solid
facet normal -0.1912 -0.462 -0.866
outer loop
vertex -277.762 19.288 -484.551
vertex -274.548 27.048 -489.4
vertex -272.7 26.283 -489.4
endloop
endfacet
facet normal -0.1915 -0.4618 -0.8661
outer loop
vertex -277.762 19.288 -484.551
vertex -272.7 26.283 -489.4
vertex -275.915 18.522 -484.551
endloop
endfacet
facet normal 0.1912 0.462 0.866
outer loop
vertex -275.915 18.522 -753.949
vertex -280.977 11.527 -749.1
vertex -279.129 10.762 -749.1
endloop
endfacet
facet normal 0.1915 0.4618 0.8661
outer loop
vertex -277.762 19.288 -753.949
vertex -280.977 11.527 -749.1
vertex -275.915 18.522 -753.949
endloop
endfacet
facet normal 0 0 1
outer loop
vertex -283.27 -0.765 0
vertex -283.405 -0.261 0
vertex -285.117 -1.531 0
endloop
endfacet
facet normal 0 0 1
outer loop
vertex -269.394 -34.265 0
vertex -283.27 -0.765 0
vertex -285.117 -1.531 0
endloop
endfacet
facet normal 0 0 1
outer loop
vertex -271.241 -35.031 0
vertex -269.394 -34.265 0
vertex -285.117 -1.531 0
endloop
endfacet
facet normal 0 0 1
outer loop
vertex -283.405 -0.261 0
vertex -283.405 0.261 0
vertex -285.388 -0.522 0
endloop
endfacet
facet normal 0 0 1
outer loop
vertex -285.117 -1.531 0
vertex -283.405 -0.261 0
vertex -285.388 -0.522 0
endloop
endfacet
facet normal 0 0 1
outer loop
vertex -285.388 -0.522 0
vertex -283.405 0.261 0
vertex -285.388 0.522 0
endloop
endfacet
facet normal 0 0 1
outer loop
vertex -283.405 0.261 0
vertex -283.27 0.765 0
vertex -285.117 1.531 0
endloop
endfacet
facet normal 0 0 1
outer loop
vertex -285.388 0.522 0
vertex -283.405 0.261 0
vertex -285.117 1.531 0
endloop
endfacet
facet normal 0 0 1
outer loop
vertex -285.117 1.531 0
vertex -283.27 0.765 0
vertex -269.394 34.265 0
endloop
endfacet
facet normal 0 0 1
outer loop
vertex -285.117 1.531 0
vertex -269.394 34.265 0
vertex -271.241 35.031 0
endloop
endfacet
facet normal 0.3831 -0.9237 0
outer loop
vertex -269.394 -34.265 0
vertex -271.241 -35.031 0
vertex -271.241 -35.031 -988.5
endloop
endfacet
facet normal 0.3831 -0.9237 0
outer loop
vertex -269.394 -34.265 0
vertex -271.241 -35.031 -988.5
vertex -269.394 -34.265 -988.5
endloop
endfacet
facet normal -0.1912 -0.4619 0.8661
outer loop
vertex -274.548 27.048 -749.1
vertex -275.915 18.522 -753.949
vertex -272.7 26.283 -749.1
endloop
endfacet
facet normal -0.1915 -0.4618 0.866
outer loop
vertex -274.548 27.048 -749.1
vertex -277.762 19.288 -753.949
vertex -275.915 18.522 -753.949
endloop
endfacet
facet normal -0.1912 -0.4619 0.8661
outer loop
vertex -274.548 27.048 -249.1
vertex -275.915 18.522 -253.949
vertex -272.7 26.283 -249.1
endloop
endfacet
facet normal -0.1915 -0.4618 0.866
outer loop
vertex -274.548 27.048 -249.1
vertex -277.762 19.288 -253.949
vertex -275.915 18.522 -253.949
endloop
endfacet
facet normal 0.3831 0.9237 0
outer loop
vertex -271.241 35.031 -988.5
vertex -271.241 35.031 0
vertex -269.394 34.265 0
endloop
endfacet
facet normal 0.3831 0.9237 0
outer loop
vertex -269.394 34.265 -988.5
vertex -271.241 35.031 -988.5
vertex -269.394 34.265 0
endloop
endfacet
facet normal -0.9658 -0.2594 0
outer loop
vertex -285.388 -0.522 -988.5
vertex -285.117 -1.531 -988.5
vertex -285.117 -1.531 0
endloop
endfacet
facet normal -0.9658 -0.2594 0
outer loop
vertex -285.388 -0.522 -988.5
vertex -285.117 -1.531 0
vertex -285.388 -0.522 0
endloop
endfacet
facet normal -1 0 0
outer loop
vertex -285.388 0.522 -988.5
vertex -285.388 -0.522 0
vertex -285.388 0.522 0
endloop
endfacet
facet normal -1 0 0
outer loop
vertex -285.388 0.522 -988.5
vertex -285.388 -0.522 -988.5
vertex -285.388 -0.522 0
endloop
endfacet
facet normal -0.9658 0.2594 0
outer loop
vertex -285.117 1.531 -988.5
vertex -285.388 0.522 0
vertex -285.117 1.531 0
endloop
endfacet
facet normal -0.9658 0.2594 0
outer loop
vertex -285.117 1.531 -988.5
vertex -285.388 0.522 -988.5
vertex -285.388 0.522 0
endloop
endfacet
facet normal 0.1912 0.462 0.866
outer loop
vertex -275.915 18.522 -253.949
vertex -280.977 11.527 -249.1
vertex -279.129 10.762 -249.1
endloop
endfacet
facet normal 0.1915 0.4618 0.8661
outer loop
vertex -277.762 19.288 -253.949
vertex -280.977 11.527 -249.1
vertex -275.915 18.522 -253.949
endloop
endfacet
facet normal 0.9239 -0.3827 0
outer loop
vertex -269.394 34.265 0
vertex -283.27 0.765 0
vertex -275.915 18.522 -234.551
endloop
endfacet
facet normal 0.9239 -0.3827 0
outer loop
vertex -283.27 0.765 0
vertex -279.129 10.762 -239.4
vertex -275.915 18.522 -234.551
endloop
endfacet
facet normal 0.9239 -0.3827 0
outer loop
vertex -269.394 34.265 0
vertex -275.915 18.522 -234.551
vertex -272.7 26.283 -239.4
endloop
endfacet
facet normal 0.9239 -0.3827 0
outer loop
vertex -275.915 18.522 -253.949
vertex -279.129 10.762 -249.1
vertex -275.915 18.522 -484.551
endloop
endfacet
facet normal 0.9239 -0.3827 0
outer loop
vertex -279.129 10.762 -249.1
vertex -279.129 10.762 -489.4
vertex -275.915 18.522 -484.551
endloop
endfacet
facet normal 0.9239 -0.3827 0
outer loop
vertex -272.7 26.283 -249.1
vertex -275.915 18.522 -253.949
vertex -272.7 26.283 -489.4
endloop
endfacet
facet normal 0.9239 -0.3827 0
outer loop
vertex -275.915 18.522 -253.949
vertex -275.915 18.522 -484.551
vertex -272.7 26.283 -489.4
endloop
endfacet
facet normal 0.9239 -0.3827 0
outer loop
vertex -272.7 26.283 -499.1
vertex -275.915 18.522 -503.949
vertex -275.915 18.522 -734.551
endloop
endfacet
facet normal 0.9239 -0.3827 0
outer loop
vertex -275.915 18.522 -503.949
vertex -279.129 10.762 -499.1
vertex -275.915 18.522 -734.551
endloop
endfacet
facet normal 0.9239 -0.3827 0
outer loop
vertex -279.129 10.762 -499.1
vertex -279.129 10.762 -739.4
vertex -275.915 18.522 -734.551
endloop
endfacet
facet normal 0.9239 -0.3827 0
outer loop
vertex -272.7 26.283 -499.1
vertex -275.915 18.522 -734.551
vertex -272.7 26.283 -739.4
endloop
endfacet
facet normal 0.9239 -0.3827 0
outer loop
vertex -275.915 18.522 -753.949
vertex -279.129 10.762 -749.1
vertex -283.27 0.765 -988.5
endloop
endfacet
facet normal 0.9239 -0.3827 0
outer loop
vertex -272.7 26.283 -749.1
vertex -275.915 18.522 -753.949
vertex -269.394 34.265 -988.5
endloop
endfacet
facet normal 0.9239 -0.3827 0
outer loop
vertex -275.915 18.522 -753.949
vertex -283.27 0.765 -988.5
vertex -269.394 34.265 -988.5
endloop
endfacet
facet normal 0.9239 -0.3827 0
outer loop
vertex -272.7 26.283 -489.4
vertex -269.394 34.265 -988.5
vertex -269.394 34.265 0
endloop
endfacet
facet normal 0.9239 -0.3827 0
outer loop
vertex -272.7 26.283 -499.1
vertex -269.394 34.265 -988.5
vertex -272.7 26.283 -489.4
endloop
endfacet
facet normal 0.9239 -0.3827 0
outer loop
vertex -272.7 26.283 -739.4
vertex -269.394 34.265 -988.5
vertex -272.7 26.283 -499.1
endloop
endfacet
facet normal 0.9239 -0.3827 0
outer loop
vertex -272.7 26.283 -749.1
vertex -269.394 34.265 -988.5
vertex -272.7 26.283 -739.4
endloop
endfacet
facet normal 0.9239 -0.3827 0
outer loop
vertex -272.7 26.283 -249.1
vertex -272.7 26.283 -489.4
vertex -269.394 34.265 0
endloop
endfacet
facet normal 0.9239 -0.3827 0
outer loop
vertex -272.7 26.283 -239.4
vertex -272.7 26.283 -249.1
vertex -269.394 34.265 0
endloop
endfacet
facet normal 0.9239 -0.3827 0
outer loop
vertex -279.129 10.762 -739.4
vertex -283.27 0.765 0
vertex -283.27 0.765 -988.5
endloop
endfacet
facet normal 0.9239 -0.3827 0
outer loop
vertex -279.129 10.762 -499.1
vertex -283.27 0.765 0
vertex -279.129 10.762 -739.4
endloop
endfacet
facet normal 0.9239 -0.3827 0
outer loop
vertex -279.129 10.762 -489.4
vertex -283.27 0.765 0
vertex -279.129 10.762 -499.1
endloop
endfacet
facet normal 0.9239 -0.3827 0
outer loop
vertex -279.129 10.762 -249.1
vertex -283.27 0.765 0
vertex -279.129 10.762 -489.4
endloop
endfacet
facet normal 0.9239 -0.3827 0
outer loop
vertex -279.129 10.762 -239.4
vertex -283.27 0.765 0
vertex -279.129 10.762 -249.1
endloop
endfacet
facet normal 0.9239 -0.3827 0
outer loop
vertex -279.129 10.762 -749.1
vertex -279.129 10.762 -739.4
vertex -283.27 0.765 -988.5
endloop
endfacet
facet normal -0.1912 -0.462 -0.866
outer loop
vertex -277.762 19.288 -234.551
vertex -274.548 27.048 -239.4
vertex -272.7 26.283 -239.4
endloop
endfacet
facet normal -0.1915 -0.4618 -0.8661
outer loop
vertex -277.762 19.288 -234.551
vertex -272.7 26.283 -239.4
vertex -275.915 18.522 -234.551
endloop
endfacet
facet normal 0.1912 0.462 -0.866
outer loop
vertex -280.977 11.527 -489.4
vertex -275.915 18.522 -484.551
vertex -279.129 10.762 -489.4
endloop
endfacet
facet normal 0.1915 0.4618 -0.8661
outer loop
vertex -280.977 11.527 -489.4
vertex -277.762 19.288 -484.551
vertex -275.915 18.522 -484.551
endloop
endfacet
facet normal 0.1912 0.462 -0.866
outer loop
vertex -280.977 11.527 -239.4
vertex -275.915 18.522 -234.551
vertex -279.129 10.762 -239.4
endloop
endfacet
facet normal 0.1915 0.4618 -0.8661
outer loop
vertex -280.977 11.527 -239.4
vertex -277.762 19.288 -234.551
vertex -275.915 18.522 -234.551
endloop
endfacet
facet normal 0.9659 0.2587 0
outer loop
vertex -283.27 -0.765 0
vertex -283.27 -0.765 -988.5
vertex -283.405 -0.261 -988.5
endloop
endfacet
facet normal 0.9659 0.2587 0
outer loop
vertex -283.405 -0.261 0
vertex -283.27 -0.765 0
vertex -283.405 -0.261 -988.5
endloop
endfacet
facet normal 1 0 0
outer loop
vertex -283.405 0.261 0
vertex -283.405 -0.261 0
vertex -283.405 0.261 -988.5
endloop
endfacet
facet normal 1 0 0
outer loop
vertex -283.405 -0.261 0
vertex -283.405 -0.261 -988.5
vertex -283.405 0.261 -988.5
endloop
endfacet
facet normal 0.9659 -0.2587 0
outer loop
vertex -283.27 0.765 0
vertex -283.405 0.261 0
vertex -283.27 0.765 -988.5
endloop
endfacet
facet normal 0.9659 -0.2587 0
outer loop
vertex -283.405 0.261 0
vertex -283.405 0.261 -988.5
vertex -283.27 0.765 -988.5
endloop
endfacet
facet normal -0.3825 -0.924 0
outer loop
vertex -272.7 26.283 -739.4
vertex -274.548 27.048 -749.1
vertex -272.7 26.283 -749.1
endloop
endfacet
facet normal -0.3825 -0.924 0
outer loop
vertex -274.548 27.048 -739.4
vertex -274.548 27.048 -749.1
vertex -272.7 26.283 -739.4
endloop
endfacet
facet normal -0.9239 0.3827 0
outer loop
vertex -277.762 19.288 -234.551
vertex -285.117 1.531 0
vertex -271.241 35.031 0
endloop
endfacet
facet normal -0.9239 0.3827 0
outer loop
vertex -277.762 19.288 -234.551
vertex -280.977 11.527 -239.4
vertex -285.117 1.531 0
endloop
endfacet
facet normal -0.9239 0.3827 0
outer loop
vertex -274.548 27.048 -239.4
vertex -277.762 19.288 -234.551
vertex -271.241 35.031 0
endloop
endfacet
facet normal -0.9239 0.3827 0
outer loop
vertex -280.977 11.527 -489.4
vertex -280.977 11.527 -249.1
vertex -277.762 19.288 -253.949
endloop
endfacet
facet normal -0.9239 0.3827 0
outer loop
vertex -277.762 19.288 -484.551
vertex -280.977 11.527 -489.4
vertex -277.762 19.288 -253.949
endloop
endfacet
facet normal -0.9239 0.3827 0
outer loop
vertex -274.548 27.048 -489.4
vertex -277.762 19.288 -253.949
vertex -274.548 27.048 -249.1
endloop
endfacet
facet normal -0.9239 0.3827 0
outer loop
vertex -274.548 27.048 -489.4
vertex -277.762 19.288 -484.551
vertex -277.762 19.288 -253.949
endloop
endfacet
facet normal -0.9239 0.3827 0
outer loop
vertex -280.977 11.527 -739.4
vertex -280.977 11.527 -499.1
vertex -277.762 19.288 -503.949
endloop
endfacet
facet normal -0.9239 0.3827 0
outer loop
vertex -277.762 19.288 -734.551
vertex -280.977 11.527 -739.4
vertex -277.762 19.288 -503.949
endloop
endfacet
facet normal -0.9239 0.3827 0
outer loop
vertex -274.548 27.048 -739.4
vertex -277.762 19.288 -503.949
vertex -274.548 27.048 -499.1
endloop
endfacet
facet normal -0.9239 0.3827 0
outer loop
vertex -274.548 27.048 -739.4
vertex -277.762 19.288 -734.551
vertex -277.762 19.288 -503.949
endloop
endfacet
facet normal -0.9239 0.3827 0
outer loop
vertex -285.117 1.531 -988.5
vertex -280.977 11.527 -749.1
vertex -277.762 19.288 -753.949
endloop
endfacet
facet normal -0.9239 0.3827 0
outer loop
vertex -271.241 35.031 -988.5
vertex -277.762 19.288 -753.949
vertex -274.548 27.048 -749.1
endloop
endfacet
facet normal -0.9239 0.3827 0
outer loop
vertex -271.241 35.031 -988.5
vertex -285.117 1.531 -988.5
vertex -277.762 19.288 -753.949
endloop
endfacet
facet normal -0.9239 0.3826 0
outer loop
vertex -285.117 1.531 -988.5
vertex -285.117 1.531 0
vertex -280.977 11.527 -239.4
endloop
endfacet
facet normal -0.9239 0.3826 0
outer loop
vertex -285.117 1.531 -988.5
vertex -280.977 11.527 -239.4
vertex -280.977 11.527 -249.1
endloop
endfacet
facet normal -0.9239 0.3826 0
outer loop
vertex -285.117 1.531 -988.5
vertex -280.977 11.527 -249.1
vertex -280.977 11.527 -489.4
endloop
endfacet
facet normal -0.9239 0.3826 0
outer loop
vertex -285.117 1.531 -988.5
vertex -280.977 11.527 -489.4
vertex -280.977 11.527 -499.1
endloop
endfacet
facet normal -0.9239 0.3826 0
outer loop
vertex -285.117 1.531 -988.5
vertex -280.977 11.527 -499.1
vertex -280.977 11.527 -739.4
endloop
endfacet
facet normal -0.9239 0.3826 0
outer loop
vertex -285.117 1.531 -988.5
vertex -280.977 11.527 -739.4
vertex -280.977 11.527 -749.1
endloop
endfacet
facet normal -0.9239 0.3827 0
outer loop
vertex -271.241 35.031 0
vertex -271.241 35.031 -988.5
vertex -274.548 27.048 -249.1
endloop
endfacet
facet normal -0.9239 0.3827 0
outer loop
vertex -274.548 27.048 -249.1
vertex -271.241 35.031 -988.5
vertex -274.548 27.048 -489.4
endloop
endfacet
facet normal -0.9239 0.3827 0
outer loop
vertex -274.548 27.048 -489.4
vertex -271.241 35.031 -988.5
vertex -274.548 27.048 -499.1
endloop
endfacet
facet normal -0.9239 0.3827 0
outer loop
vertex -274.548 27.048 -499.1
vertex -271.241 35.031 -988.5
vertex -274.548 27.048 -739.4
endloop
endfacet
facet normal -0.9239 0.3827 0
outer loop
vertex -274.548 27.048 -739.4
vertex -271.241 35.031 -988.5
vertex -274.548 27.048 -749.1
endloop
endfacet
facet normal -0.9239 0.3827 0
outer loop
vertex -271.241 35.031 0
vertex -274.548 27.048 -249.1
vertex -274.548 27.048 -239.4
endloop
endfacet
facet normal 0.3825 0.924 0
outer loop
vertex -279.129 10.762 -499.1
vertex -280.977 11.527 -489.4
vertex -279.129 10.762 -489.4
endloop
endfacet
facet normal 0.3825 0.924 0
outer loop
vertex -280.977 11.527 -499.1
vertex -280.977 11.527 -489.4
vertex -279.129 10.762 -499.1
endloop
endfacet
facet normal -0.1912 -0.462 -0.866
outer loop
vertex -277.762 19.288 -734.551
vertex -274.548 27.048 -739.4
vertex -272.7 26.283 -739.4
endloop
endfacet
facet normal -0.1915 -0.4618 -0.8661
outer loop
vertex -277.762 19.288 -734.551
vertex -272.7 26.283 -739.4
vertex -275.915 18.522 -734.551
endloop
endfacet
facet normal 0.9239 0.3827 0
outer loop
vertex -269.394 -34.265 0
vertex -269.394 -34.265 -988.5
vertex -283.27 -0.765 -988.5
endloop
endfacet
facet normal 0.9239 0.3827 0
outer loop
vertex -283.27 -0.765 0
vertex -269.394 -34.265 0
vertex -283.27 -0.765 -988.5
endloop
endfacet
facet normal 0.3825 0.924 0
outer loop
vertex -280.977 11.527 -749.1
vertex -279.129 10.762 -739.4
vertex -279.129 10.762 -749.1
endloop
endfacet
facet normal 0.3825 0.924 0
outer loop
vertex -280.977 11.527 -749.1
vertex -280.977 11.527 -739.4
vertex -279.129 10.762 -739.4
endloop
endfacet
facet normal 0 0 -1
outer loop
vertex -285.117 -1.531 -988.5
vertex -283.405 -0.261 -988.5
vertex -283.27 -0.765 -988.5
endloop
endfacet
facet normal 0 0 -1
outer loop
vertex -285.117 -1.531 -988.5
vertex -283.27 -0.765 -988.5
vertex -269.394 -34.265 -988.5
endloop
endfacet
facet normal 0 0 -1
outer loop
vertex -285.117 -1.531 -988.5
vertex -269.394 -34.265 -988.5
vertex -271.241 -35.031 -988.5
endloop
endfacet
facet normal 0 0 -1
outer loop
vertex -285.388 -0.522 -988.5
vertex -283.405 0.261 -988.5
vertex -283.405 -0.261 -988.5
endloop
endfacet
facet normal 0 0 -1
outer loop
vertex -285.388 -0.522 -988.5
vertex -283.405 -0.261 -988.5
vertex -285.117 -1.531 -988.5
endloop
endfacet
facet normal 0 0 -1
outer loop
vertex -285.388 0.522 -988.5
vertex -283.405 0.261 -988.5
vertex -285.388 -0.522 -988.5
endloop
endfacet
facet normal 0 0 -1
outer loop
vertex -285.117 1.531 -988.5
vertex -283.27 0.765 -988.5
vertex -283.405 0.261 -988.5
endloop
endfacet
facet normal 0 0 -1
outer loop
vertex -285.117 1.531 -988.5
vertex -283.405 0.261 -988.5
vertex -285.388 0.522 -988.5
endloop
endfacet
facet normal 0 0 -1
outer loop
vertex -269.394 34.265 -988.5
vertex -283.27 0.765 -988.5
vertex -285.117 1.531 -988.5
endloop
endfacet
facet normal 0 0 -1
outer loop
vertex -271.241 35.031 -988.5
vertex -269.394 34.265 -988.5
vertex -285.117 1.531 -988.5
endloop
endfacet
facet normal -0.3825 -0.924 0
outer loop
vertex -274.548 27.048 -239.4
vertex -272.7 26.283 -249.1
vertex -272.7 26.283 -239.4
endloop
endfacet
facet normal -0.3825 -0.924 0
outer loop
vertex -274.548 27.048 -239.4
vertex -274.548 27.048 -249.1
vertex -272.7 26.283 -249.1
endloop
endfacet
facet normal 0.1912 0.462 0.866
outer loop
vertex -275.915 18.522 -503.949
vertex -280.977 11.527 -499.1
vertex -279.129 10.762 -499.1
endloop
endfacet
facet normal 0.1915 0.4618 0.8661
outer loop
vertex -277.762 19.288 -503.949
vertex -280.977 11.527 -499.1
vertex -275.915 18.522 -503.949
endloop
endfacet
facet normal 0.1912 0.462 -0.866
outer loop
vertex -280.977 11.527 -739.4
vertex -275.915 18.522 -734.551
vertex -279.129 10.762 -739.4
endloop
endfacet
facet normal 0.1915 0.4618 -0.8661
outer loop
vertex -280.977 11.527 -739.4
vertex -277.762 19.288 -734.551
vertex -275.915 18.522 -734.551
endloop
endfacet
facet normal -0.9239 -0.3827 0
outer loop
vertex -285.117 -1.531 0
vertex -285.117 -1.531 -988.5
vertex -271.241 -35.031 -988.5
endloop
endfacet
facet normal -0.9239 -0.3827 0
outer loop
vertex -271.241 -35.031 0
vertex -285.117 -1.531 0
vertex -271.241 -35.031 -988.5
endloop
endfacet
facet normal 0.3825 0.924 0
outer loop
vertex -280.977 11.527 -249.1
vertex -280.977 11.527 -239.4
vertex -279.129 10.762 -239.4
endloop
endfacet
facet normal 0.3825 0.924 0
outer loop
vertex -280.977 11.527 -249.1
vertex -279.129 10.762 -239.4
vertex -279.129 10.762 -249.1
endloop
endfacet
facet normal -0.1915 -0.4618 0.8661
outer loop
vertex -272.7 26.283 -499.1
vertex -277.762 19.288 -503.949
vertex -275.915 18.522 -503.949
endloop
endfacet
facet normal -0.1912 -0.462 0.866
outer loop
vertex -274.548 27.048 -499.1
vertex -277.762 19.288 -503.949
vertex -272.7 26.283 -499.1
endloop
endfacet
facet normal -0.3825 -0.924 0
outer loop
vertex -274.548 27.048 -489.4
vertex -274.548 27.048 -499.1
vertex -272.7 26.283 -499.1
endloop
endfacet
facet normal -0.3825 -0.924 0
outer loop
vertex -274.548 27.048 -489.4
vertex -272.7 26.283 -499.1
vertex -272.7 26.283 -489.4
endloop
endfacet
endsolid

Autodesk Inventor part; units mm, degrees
ref_plane "YZ Plane" through (0, 0, 0) normal (1, 0, 0) x (0, 1, 0)
ref_plane "XZ Plane" through (0, 0, 0) normal (0, 1, 0) x (-1, 0, 0)
ref_plane "XY Plane" through (0, 0, 0) normal (0, 0, 1) x (1, 0, 0)
sketch "Sketch4" plane through (0, 0, 0) normal (0, 0, 1) x (1, 0, 0)
  line L0 (-202.056852, 202.056852) -> (0, 285.751541) construction
  line L1 (0, 285.751541) -> (202.056852, 202.056852) construction
  line L2 (202.056852, 202.056852) -> (285.751541, 0) construction
  line L3 (285.751541, 0) -> (202.056852, -202.056852) construction
  line L4 (202.056852, -202.056852) -> (0, -285.751541) construction
  line L5 (0, -285.751541) -> (-202.056852, -202.056852) construction
  line L6 (-202.056852, -202.056852) -> (-285.751541, 0) construction
  line L7 (-285.751541, 0) -> (-202.056852, 202.056852) construction
  line L8 (-285.11749, 1.530734) -> (-271.241389, 35.030606)
  line L9 (-285.11749, -1.530734) -> (-271.241389, -35.030606)
  arc A0 (-285.11749, 1.530734) -> (-285.11749, -1.530734) centre (-281.421972, 0) ccw
  point P0 (0, 0)
  point P1 (0, 0)
  point P2 (0, 0)
  dimension "d16" = 528
  dimension "d23" = 36.26
  dimension "d24" = 4
contour flange "Contour Flange1" sketch "Sketch4" thickness 2 bend radius 2 width 988.5 along (0, 0, -1) mid plane no both sides no wall seen from (-278.17944, 18.28067, 0) lies toward (0.9238795, -0.3826834, 0) curves L8 A0 L9
bend "Bend2"
corner "Corner2"
sketch "Sketch6" plane through (-285.11749, 1.530734, 0) normal (-0.9238795, 0.3826834, 0) x (0.3826834, 0.9238795, 0)
  circle A0 centre (19.22, 40.75) radius 5.5 construction
  circle A1 centre (19.22, 947.75) radius 5.5 construction
  line L0 (0, 0) -> (0, 988.5)
  line L1 (36.26, 988.5) -> (0, 988.5)
  line L2 (36.26, 0) -> (0, 0)
  line L3 (27.62, 942.900258) -> (19.22, 938.050515)
  line L4 (19.22, 938.050515) -> (10.82, 942.900258)
  line L5 (10.82, 942.900258) -> (10.82, 952.599742)
  line L6 (10.82, 952.599742) -> (19.22, 957.449485)
  line L7 (19.22, 957.449485) -> (27.62, 952.599742)
  line L8 (27.62, 952.599742) -> (27.62, 942.900258)
  line L9 (27.62, 35.900258) -> (19.22, 31.050515)
  line L10 (19.22, 31.050515) -> (10.82, 35.900258)
  line L11 (10.82, 35.900258) -> (10.82, 45.599742)
  line L12 (10.82, 45.599742) -> (19.22, 50.449485)
  line L13 (19.22, 50.449485) -> (27.62, 45.599742)
  line L14 (27.62, 45.599742) -> (27.62, 35.900258)
  point P0 (107.695526, 0)
  dimension "d36" = 11
  dimension "d41" = 11
  dimension "d93" = 19.22
  dimension "d94" = 40.75
  dimension "d95" = 19.22
  dimension "d96" = 40.75
  dimension "d98" = 16.8
  dimension "d99" = 16.8
extrude "Extrusion1" [suppressed]
sketch "Sketch13" plane through (-285.11749, 1.530734, 0) normal (-0.9238795, 0.3826834, 0) x (0.3826834, 0.9238795, 0)
  circle A0 centre (19.22, 494.25) radius 5.5 construction
  line L0 (36.26, 0) -> (36.26, 988.5)
  line L1 (36.26, 0) -> (0, 0)
  line L2 (27.62, 489.400258) -> (19.22, 484.550515)
  line L3 (19.22, 484.550515) -> (10.82, 489.400258)
  line L4 (10.82, 489.400258) -> (10.82, 499.099742)
  line L5 (10.82, 499.099742) -> (19.22, 503.949485)
  line L6 (19.22, 503.949485) -> (27.62, 499.099742)
  line L7 (27.62, 499.099742) -> (27.62, 489.400258)
  point P0 (107.695526, 0)
  point P1 (36.26, 494.25)
  point P2 (35, 910)
  point P3 (35, 1110)
  point P4 (18.13, 0)
  point P5 (27.62, 494.25)
  dimension "d83" = 11
  dimension "magic_d1" = 17.04
  dimension "d97" = 16.8
extrude "Extrusion7" cut sketch "Sketch13" against normal through all
pattern_linear "Rectangular Pattern5" count 3 spacing 250 along (0, 0, 1) of "Extrusion7" first direction both ways yes
equation "\"d16\" = Барабан_размер_по_плоскостям - Thickness"
equation "\"d24\" = BendRadius + Thickness"
equation "\"d41\" = d36"
equation "\"d95\" = d93"
equation "\"d96\" = d94"
equation "\"d99\" = d98"
equation "\"d25\" = Thickness"
equation "\"d26\" = BendReliefWidth"
equation "\"d27\" = BendReliefDepth"
equation "\"d28\" = MinimumRemnant"
equation "\"d29\" = TransitionRadius"
equation "\"d31\" = BendRadius"
equation "\"d33\" = CornerReliefSize"
equation "\"d34\" = GapSize"
equation "\"d35\" = JacobiRadiusSize"
equation "\"BendRadius\" = Thickness"
equation "\"BendReliefWidth\" = Thickness"
equation "\"BendReliefDepth\" = 0.5 * Thickness"
equation "\"CornerReliefSize\" = 4 * Thickness"
equation "\"MinimumRemnant\" = 2 * Thickness"
equation "\"TransitionRadius\" = BendRadius"
equation "\"JacobiRadiusSize\" = BendRadius"
equation "\"GapSize\" = Thickness"
equation "\"Барабан_размер_по_плоскостям\" = 530"
equation "\"Thickness\" = 2"
properties part number "DMF 01 17 опора крышки v2.1_CPY" material "Stainless Steel AISI 304"
